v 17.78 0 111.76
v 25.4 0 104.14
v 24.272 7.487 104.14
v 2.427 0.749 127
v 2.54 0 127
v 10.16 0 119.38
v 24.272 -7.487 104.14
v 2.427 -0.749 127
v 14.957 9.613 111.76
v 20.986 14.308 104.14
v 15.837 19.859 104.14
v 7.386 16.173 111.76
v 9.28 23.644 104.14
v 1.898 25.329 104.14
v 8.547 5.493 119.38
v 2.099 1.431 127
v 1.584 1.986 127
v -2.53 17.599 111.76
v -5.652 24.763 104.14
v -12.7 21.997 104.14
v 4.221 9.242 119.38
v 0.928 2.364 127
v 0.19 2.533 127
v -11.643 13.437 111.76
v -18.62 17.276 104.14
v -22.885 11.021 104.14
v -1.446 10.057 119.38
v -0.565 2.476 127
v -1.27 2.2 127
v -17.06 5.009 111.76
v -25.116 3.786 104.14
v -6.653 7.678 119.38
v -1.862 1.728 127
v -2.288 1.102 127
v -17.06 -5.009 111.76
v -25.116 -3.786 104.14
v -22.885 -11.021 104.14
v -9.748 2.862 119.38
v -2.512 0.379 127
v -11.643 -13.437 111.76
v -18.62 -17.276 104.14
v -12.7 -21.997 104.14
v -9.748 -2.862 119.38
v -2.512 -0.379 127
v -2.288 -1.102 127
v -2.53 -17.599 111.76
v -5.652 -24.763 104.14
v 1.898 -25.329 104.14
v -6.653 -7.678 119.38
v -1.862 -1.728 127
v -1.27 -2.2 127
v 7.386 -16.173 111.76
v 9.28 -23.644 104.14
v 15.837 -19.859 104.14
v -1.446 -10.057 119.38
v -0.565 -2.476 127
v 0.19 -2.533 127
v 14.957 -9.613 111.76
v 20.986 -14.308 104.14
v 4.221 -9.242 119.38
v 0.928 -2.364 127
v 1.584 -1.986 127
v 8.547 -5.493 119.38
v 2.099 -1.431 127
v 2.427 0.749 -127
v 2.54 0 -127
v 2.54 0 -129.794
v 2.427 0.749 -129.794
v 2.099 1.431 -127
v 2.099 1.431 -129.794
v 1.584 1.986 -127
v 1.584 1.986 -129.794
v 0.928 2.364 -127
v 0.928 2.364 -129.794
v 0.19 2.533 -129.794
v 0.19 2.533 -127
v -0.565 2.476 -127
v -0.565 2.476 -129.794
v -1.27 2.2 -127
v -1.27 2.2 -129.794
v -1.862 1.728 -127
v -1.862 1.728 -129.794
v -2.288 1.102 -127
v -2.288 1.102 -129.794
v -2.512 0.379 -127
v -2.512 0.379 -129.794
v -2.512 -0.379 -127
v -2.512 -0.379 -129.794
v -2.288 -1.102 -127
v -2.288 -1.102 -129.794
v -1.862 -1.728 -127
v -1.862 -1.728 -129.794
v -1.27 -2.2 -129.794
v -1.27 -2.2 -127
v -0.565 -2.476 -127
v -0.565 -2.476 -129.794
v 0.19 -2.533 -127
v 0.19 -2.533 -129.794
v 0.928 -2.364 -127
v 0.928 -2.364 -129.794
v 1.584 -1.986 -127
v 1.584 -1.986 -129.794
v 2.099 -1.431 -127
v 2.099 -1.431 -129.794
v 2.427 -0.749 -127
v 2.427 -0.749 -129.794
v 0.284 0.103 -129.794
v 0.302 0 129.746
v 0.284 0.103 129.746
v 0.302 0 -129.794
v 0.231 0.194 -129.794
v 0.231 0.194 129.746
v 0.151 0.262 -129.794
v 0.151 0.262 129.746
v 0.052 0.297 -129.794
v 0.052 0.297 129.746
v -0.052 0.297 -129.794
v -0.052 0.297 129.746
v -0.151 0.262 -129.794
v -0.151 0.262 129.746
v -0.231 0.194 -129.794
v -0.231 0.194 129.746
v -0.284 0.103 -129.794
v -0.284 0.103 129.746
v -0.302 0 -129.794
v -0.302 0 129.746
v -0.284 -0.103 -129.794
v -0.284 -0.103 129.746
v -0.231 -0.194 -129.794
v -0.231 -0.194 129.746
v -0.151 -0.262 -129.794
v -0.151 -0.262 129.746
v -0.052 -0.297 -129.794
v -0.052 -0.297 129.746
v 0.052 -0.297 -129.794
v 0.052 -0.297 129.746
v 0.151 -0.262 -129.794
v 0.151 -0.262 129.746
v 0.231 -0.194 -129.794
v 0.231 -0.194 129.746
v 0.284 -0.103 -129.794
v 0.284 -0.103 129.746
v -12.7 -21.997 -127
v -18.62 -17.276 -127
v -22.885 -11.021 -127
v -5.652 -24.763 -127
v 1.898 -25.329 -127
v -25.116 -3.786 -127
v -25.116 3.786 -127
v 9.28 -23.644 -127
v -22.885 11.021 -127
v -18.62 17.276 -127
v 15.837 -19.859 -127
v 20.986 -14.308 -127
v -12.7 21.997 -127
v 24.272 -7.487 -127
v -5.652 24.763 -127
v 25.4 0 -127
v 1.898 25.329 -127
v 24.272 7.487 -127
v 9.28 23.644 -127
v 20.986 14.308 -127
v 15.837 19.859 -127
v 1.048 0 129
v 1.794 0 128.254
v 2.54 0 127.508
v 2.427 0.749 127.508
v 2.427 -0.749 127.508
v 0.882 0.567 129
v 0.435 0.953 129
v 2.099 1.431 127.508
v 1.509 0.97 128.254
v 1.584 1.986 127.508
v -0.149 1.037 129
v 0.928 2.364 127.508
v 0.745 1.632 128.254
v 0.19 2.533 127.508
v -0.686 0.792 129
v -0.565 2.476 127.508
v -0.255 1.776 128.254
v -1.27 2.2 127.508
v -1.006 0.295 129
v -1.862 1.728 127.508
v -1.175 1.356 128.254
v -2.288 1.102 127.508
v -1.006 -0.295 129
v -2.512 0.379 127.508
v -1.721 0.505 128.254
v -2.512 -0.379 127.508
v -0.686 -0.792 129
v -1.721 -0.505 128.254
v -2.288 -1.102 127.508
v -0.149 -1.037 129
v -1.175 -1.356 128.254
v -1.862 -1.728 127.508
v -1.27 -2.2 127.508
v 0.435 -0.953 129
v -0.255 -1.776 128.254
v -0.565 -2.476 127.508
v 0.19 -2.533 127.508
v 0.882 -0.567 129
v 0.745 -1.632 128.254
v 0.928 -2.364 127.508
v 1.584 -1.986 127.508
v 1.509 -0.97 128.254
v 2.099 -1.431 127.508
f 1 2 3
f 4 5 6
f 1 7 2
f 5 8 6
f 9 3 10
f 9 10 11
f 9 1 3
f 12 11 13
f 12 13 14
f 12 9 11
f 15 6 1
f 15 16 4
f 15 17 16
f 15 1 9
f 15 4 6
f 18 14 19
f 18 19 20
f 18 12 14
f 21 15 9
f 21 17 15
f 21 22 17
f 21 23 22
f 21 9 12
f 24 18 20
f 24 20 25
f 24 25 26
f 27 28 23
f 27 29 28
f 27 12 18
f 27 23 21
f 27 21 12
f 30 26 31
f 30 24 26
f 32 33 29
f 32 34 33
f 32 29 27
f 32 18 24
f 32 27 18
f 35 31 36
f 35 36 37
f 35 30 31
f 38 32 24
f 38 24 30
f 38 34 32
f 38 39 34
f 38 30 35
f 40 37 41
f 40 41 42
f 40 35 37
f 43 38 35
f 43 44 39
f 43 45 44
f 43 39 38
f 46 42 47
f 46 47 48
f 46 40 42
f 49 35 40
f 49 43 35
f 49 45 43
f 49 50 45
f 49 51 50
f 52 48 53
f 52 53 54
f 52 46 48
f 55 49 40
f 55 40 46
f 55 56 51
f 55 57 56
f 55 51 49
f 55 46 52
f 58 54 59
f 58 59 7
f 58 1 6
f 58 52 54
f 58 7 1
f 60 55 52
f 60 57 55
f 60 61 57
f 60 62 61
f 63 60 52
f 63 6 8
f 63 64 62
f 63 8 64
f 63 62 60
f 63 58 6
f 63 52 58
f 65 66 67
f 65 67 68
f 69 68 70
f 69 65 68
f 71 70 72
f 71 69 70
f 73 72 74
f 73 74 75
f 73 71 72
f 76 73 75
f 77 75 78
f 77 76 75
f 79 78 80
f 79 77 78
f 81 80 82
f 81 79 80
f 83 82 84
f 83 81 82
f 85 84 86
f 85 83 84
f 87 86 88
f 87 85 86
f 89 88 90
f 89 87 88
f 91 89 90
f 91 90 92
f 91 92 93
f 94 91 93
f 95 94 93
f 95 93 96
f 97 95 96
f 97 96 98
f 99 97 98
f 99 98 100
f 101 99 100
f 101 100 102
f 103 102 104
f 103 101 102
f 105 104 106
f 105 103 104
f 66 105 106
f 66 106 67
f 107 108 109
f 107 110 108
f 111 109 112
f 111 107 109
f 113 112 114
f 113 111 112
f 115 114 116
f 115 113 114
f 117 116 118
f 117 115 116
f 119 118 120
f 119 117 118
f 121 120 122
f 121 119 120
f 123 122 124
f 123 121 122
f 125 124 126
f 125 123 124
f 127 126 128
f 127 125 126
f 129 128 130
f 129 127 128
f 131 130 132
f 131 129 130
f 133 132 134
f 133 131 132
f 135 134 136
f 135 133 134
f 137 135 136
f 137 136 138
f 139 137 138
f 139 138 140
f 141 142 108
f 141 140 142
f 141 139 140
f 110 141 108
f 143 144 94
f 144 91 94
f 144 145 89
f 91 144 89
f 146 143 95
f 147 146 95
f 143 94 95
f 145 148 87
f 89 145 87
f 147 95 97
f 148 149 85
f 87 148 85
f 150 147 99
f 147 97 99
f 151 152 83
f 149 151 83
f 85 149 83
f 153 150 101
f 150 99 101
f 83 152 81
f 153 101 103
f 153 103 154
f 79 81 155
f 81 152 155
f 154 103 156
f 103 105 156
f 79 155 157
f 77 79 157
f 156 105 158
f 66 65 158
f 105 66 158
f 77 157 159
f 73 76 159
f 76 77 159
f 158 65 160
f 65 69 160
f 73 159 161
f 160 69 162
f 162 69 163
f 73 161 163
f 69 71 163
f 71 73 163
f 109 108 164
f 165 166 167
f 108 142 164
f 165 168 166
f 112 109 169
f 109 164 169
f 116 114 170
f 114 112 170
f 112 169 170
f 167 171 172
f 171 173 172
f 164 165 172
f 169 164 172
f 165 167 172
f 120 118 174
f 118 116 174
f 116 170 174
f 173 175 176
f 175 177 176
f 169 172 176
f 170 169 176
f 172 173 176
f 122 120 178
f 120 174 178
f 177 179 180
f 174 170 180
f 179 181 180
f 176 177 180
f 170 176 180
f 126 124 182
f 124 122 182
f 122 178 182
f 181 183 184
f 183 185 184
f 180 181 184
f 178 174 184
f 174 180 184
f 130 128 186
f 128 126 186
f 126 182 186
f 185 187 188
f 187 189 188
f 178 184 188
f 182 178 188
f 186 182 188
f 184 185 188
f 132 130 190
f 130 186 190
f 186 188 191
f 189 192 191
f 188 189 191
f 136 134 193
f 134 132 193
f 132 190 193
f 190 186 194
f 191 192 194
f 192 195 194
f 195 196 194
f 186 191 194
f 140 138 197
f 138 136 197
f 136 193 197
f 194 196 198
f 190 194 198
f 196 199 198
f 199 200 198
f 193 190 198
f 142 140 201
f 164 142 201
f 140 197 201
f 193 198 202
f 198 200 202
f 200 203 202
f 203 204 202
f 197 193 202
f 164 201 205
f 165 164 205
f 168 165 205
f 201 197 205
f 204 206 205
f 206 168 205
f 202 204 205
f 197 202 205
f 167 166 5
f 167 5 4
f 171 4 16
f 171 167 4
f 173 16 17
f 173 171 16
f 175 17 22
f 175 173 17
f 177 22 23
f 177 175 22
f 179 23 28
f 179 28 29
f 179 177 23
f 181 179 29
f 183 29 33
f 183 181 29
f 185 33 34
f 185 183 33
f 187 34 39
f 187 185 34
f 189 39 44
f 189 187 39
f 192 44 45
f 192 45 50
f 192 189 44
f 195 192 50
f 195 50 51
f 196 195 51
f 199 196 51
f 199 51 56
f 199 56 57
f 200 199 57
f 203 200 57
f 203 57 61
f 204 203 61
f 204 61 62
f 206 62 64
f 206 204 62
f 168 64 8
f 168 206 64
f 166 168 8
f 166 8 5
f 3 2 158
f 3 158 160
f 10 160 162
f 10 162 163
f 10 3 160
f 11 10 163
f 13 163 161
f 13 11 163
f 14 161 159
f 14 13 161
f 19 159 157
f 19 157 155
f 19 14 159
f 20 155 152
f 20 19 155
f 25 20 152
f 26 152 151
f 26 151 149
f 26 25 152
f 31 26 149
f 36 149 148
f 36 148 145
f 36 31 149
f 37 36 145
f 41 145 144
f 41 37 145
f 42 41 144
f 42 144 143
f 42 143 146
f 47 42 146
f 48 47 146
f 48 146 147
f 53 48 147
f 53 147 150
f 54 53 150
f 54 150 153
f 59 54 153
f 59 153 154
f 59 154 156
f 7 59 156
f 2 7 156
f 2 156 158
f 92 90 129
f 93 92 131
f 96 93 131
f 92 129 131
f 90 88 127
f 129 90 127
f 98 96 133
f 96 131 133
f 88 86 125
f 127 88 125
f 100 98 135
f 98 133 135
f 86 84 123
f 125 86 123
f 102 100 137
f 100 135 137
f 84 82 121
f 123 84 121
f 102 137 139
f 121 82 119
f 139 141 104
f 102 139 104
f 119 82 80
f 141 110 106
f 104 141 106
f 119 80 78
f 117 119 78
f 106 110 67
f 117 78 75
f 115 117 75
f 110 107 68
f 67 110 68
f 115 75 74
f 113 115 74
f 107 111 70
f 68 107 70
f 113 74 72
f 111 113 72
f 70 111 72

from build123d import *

# Parameters (mm, degrees)
F0_R     = 25.4
F1_DEPTH = 127
F2_SIZE  = 22.86
F4_DEPTH = 254.001
F5_R     = 2.54
F5_R_2   = 0.3020400554
F6_DEPTH = 129.794


# Not quite as in the source:
# - a fillet or chamfer that OpenCascade refuses, or shapes differently, is made with other operations: its cross-section is extruded or revolved along the edge and cut away or added


with BuildPart() as f1:
    # F0 (on Top) → F1 (new body, symmetric)
    with BuildSketch(Plane.XY):
        Circle(F0_R)
    extrude(amount=F1_DEPTH, both=True)

    # F2
    f2_edges = [f1.edges().sort_by_distance(p)[0] for p in [
        (-25.4, 0, 127),
    ]]
    chamfer(f2_edges, length=F2_SIZE)

    # F4 (cut, through all): a face of the model
    f4_faces = [f1.faces().sort_by_distance(p)[0] for p in [
        (0, 0, 127),
    ]]
    extrude(f4_faces, amount=-F4_DEPTH, mode=Mode.SUBTRACT)

    # F5 (on Top) → F6 (join, symmetric)
    with BuildSketch(Plane.XY):
        Circle(F5_R)
        Circle(F5_R_2, mode=Mode.SUBTRACT)
    extrude(amount=F6_DEPTH, both=True)

    # F7: chamfer of 2.286 on 1 edges, made by hand

    # F7_s1 → F7_t2 (revolve, cut)
    with BuildSketch(Plane.XZ):
        Polygon((0.254, 129.794), (2.54, 127.508), (2.54, 129.794), align=None)
    revolve(axis=Axis((0, 0, 129.794), (0, 0, 1)), mode=Mode.SUBTRACT)


solid = f1.part
